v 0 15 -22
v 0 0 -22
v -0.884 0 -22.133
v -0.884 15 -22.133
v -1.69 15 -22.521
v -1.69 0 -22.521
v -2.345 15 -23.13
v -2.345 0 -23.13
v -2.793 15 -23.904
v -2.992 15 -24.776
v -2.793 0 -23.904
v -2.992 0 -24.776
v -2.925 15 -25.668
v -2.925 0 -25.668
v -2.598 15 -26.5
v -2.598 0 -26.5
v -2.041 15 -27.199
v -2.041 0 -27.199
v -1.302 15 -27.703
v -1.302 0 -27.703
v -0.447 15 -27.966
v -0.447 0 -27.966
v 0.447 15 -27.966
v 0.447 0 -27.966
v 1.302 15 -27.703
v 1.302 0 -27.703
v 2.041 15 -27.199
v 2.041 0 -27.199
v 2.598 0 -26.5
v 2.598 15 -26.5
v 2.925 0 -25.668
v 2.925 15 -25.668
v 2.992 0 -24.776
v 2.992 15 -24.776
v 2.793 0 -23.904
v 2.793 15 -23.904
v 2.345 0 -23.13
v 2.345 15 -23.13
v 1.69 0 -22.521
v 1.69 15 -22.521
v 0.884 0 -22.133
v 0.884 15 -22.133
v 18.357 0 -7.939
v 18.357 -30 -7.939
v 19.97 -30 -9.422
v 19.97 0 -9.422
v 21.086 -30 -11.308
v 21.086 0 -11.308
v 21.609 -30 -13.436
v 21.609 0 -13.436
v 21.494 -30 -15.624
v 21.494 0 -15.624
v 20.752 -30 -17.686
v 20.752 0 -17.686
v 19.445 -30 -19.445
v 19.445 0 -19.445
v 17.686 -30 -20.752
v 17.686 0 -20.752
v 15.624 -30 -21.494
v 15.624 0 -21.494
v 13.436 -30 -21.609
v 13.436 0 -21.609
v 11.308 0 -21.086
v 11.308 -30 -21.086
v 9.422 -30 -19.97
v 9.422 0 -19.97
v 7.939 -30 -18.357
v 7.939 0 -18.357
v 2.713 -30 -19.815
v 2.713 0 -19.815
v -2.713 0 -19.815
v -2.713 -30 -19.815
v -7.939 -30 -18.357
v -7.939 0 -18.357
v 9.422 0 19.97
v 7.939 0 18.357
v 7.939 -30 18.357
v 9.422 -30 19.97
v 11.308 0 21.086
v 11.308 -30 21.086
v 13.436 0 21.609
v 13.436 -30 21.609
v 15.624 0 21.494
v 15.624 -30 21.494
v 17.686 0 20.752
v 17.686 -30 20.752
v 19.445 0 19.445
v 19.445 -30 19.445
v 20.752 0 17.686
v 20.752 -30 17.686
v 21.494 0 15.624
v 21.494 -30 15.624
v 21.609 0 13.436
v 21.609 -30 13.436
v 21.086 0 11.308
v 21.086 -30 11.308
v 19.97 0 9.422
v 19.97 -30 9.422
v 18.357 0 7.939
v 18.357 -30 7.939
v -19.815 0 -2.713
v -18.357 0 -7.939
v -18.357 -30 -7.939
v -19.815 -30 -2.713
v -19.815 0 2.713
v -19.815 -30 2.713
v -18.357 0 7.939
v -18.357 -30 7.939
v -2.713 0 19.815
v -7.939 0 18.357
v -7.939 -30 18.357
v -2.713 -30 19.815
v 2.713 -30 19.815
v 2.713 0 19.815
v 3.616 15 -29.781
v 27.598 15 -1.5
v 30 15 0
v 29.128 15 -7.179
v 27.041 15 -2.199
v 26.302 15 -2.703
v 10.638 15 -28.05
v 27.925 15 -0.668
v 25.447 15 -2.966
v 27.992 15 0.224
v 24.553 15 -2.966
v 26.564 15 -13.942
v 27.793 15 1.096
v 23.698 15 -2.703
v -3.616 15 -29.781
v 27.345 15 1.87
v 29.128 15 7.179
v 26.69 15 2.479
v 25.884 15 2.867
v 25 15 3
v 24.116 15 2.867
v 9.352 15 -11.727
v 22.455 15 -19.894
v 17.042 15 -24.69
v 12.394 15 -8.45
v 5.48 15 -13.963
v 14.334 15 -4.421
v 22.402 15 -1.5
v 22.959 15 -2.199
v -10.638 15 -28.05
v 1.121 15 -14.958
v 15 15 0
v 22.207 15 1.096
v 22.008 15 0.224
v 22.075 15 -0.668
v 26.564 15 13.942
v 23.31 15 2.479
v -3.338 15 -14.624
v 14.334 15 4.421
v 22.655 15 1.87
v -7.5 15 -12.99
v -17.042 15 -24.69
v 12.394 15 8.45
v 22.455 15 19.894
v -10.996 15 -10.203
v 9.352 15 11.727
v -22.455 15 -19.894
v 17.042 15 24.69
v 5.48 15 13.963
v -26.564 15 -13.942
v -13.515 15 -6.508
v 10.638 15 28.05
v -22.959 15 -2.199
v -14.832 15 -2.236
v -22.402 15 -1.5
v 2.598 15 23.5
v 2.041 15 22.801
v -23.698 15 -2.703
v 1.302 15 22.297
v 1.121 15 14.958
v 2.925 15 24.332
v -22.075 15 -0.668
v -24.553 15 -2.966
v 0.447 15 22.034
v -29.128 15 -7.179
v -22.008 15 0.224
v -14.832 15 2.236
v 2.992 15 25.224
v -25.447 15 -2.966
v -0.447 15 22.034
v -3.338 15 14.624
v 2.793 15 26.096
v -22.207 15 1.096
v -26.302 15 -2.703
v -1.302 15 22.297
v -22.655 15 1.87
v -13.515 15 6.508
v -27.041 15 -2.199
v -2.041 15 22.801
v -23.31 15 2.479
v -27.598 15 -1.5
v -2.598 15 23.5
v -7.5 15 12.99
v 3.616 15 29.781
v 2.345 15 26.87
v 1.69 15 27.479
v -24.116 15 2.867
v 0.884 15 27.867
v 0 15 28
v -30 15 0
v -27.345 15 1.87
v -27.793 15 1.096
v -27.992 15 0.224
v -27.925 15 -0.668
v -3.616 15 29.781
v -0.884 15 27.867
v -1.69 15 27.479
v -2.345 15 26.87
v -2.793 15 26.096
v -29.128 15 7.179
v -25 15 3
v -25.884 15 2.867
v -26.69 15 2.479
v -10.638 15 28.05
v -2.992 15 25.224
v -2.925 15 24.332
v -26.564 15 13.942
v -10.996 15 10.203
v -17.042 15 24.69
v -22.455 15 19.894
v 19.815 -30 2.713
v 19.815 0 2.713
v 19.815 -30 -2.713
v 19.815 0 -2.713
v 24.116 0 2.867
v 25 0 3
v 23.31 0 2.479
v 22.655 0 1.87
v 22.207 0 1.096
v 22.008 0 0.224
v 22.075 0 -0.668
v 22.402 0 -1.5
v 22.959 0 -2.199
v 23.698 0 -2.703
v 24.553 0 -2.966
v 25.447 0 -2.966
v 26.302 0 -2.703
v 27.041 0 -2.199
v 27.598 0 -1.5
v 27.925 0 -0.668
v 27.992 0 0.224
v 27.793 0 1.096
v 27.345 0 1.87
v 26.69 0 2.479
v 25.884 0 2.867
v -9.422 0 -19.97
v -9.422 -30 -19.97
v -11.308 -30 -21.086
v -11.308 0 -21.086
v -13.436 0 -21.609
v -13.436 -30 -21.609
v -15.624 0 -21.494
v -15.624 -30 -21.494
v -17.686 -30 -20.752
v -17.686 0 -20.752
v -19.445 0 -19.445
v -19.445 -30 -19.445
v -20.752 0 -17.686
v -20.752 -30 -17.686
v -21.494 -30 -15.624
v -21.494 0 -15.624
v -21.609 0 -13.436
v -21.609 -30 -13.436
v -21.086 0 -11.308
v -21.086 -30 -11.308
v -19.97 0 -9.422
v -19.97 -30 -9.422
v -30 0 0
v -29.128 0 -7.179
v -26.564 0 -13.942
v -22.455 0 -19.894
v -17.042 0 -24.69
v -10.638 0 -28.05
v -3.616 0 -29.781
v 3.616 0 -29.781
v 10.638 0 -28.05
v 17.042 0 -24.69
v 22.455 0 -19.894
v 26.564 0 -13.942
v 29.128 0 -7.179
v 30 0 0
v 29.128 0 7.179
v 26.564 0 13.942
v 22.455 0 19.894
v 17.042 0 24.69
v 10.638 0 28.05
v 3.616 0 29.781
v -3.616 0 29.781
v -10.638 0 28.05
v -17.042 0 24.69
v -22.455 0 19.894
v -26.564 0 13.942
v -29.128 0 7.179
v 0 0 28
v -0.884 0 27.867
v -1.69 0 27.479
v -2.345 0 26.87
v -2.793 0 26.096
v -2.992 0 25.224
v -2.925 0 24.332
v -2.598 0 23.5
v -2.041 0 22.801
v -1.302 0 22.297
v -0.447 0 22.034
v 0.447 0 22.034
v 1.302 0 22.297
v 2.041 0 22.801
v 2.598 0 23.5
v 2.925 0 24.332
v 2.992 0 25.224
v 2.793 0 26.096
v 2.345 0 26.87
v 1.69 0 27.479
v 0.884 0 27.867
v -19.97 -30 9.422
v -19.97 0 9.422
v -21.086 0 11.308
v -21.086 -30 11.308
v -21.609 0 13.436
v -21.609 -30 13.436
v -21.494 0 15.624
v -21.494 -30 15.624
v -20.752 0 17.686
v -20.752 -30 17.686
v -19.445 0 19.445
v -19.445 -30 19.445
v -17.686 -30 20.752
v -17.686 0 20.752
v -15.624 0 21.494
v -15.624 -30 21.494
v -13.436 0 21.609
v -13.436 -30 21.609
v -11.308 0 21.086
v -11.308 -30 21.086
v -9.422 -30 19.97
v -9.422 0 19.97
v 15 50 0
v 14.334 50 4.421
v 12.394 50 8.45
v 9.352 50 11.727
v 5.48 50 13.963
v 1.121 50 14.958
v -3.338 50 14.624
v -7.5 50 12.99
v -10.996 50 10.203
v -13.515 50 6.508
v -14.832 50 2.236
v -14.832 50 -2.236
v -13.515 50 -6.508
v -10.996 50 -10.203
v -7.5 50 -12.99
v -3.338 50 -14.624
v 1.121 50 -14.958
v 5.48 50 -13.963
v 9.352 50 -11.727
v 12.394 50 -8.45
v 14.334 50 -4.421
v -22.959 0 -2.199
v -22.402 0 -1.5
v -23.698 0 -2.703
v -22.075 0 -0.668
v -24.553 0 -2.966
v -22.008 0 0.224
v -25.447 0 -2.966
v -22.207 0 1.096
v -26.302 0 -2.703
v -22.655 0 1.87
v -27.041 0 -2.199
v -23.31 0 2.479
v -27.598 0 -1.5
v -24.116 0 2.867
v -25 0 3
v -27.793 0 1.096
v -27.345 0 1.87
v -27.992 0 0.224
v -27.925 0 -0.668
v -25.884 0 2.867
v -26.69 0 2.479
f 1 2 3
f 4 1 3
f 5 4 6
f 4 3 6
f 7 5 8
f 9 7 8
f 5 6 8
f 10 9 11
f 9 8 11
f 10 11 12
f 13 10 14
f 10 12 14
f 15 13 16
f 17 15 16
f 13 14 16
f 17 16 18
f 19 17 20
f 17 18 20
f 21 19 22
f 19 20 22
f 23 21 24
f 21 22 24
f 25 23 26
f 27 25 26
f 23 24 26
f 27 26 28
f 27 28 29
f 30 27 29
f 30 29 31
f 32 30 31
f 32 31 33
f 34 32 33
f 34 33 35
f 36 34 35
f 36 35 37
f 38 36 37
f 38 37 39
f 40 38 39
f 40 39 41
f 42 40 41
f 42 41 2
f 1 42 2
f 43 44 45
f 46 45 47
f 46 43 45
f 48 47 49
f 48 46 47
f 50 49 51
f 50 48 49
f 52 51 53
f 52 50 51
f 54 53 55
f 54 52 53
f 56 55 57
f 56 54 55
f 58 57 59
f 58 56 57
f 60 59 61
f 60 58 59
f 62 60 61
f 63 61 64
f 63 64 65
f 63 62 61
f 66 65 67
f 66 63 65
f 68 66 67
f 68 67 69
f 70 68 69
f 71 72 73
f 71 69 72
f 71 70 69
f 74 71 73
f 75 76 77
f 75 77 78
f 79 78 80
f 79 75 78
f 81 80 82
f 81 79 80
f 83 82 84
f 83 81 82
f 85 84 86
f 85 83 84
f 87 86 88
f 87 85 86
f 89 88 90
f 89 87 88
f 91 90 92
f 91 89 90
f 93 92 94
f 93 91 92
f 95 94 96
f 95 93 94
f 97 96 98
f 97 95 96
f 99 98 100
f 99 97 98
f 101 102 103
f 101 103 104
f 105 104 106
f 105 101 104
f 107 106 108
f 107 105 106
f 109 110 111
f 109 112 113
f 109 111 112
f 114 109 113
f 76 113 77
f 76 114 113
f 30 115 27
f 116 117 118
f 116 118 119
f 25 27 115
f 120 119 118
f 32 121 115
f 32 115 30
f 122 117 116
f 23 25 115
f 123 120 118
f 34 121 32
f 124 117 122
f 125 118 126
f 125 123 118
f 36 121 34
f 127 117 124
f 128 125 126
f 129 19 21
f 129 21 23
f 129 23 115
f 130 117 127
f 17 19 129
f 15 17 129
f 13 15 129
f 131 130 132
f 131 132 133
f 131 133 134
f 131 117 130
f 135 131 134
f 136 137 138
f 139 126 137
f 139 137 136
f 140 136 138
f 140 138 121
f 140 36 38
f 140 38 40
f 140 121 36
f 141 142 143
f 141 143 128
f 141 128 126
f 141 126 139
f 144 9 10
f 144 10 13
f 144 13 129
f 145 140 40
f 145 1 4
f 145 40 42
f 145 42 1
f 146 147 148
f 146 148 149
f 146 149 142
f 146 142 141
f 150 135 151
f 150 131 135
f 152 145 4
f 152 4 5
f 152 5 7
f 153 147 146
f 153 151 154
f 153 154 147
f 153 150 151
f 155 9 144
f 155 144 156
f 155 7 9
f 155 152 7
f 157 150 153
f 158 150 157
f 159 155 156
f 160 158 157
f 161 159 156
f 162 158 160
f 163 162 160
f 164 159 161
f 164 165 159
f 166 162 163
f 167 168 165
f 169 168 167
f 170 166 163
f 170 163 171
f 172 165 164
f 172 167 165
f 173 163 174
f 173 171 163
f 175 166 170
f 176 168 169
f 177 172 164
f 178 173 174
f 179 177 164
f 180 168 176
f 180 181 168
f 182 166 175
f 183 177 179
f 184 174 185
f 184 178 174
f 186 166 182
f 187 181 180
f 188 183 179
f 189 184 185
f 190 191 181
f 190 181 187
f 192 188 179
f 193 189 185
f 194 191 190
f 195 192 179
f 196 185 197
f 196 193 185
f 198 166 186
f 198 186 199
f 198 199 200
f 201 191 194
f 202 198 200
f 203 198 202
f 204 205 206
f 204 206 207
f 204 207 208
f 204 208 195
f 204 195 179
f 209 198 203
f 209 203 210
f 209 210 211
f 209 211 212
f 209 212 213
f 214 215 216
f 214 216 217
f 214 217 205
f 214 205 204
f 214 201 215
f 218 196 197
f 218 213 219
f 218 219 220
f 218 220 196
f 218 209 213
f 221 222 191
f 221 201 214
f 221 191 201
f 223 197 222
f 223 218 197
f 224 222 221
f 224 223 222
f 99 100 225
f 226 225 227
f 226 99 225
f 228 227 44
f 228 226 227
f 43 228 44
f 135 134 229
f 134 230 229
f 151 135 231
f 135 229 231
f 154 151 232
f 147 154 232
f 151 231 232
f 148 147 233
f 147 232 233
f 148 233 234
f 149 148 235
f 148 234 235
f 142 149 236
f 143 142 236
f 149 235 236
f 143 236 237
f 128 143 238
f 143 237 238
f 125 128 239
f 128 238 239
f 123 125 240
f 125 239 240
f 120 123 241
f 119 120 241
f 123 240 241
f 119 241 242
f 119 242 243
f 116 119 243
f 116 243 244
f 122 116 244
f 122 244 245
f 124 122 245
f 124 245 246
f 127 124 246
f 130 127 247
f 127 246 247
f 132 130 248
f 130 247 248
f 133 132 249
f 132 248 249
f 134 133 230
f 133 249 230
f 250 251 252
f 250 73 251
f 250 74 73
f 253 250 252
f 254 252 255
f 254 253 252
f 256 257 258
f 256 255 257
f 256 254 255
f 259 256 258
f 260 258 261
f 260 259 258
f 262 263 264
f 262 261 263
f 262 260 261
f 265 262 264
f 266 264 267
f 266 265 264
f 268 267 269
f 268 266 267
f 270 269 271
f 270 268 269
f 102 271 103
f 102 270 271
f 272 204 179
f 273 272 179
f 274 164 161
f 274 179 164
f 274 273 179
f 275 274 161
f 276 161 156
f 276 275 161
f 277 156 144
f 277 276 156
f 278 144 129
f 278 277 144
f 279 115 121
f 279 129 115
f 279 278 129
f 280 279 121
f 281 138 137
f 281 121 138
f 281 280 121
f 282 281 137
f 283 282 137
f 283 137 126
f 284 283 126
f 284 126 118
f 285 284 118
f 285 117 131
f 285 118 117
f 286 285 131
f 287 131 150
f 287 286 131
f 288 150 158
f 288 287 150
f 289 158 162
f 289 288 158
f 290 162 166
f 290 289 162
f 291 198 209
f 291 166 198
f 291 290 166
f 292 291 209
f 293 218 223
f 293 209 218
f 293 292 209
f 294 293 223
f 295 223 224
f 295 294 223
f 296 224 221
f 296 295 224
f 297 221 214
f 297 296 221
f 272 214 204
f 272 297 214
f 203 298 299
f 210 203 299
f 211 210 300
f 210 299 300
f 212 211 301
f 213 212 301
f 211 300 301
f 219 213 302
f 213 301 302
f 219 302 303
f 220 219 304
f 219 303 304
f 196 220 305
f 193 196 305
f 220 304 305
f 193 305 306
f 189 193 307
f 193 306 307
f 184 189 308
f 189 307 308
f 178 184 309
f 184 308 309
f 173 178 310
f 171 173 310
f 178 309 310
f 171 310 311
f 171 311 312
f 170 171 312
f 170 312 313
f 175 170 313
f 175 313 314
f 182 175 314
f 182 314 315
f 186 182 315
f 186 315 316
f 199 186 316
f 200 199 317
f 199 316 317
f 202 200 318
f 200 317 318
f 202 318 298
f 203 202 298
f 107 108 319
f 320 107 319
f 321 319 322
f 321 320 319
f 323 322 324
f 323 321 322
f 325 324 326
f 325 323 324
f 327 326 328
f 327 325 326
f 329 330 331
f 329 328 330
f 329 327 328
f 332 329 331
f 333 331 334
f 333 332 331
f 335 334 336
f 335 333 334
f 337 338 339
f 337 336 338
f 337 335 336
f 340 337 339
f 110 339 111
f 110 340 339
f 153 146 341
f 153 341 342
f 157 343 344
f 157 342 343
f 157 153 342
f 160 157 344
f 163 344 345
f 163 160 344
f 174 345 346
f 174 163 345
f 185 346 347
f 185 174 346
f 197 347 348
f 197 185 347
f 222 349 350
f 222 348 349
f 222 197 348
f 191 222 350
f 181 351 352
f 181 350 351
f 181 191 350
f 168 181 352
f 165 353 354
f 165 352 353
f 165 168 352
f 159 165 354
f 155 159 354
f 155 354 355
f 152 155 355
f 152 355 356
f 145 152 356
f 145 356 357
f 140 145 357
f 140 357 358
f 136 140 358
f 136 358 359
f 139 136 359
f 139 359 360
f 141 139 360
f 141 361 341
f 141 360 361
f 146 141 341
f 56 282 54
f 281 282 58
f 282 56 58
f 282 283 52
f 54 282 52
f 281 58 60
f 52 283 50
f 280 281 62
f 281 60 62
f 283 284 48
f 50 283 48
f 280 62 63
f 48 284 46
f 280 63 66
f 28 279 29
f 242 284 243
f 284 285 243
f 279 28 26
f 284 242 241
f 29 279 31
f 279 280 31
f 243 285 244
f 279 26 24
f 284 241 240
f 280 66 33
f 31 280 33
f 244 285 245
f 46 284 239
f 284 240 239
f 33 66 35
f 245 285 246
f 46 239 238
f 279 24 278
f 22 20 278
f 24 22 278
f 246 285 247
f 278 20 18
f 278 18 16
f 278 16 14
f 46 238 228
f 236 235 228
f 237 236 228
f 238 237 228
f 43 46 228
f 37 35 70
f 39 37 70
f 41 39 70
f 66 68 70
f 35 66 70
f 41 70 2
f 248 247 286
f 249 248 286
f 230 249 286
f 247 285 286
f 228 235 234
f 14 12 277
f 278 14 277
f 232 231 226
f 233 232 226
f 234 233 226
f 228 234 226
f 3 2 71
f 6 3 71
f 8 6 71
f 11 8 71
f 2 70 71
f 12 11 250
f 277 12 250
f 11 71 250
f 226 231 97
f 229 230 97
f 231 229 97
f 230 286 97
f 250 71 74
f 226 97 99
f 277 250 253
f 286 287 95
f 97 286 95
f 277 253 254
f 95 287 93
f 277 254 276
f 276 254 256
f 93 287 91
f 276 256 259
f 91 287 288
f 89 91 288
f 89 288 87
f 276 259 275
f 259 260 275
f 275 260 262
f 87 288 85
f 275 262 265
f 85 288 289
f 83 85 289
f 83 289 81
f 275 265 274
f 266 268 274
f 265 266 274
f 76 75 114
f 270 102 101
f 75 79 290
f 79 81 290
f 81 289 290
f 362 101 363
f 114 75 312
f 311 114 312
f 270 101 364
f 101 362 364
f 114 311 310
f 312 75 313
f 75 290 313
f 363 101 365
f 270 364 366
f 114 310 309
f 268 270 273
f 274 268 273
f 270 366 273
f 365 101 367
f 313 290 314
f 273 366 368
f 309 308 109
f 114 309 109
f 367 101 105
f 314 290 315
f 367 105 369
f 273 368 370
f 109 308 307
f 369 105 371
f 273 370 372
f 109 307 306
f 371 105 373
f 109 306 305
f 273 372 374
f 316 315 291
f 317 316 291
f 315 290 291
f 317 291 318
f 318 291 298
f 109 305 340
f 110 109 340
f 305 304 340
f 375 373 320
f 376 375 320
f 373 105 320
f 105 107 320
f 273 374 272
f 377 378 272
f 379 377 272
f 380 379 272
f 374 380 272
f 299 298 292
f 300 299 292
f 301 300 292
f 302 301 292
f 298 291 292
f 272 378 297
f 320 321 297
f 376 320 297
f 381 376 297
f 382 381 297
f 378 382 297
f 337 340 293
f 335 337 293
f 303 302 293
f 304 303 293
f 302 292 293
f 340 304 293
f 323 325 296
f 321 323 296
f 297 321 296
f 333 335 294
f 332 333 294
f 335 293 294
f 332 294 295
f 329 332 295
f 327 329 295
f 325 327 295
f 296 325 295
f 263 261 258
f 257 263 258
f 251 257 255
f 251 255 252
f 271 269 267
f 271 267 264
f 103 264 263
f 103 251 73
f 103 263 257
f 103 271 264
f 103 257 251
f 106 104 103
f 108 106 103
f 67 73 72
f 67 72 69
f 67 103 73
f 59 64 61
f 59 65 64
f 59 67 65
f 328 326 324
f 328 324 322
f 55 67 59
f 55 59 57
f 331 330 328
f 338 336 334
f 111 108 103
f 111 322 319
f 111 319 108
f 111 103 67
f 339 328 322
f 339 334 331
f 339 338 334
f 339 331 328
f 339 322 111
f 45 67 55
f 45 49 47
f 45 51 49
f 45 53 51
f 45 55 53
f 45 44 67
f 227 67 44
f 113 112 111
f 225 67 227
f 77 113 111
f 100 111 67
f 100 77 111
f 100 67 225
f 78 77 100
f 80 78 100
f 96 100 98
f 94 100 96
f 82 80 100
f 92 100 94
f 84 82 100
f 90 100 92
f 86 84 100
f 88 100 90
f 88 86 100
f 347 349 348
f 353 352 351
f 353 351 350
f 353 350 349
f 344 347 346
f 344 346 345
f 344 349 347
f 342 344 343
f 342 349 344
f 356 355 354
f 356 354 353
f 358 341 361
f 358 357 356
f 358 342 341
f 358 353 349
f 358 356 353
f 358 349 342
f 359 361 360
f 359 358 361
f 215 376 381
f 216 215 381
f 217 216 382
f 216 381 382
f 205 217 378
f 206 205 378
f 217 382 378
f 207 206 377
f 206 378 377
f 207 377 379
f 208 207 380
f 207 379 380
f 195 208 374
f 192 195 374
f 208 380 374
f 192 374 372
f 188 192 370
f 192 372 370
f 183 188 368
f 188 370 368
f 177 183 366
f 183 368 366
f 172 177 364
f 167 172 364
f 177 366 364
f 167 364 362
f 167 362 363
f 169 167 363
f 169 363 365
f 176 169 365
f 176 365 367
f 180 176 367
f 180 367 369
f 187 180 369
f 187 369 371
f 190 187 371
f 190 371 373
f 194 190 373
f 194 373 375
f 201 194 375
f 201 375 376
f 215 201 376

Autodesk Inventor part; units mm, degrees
ref_plane "YZ Plane" through (0, 0, 0) normal (1, 0, 0) x (0, 1, 0)
ref_plane "XZ Plane" through (0, 0, 0) normal (0, 1, 0) x (-1, 0, 0)
ref_plane "XY Plane" through (0, 0, 0) normal (0, 0, 1) x (1, 0, 0)
sketch "Эскиз1" plane through (0, 0, 0) normal (0, 1, 0) x (-1, 0, 0)
  circle A0 centre (0, 0) radius 30
  dimension "d0" = 60
extrude "Выдавливание1" add sketch "Эскиз1" along normal blind 15
sketch "Эскиз3" plane through (0, 0, 0) normal (0, -1, 0) x (1, 0, 0)
  circle A0 centre (0, 0) radius 20
  line L0 (0, 0) -> (30, 0) construction
  line L1 (0, 0) -> (30, 0) construction
  line L2 (0, 0) -> (30, 0) construction
  line L3 (0, 0) -> (30, 0) construction
  line L4 (0, 0) -> (14.1421, 14.1421)
  line L5 (0, 0) -> (20, 0) construction
  line L6 (0, 0) -> (14.1421, -14.1421)
  line L7 (0, 0) -> (-14.1421, 14.1421)
  line L8 (0, 0) -> (20, 0) construction
  line L9 (0, 0) -> (-14.1421, -14.1421)
  line L10 (0, 0) -> (20, 0) construction
  circle A1 centre (14.1421, 14.1421) radius 7.5
  circle A2 centre (14.1421, -14.1421) radius 7.5
  circle A3 centre (-14.1421, -14.1421) radius 7.5
  circle A4 centre (-14.1421, 14.1421) radius 7.5
  point P0 (-8.7707, -17.9743)
  point P1 (-16.2945, -11.5969)
  point P2 (-8.7707, 17.9743)
  point P3 (-16.2945, 11.5969)
  point P4 (11.5969, -16.2945)
  point P5 (17.9743, -8.7707)
  point P6 (17.995, 8.7282)
  point P7 (11.5862, 16.3021)
  point P8 (18.357, 7.9385)
  point P9 (7.9385, 18.357)
  point P10 (-7.9385, 18.357)
  point P11 (-18.357, 7.9385)
  point P12 (-18.357, -7.9385)
  point P13 (-7.9385, -18.357)
  point P14 (7.9385, -18.357)
  point P15 (18.357, -7.9385)
  dimension "d26" = 40
  dimension "d62" = 20
  dimension "d63" = 45
  dimension "d64" = 20
  dimension "d65" = 20
  dimension "d66" = 135
  dimension "d67" = 20
  dimension "d68" = 135
  dimension "d69" = 15
  dimension "d70" = 15
  dimension "d71" = 15
  dimension "d72" = 15
sketch "Эскиз4" plane through (0, 15, 0) normal (0, 1, 0) x (1, 0, 0)
  circle A0 centre (0, 0) radius 15
  dimension "d41" = 30
extrude "Выдавливание3" add sketch "Эскиз4" along normal blind 35
sketch "Эскиз5" plane through (0, 15, 0) normal (0, 1, 0) x (1, 0, 0)
  line L0 (0, 0) -> (0, -25)
  arc A0 (20, 0) -> (20, 0) centre (0, 0) ccw projected
  line L1 (0, 0) -> (25, 0)
  line L2 (0, 0) -> (0, 25)
  line L3 (0, 0) -> (-25, 0)
  dimension "d44" = 25
  dimension "d45" = 25
  dimension "d46" = 25
  dimension "d47" = 25
hole "Отверстие3" at (0, 15, 25) at (-25, 15, 0) at (0, 15, -25) at (25, 15, 0) direction (0, -1, 0) diameter 6 end through all
extrude "Выдавливание4" add sketch "Эскиз3" along normal blind 30
properties part number "Крепление Барабана2" material "Сталь, литейная"
